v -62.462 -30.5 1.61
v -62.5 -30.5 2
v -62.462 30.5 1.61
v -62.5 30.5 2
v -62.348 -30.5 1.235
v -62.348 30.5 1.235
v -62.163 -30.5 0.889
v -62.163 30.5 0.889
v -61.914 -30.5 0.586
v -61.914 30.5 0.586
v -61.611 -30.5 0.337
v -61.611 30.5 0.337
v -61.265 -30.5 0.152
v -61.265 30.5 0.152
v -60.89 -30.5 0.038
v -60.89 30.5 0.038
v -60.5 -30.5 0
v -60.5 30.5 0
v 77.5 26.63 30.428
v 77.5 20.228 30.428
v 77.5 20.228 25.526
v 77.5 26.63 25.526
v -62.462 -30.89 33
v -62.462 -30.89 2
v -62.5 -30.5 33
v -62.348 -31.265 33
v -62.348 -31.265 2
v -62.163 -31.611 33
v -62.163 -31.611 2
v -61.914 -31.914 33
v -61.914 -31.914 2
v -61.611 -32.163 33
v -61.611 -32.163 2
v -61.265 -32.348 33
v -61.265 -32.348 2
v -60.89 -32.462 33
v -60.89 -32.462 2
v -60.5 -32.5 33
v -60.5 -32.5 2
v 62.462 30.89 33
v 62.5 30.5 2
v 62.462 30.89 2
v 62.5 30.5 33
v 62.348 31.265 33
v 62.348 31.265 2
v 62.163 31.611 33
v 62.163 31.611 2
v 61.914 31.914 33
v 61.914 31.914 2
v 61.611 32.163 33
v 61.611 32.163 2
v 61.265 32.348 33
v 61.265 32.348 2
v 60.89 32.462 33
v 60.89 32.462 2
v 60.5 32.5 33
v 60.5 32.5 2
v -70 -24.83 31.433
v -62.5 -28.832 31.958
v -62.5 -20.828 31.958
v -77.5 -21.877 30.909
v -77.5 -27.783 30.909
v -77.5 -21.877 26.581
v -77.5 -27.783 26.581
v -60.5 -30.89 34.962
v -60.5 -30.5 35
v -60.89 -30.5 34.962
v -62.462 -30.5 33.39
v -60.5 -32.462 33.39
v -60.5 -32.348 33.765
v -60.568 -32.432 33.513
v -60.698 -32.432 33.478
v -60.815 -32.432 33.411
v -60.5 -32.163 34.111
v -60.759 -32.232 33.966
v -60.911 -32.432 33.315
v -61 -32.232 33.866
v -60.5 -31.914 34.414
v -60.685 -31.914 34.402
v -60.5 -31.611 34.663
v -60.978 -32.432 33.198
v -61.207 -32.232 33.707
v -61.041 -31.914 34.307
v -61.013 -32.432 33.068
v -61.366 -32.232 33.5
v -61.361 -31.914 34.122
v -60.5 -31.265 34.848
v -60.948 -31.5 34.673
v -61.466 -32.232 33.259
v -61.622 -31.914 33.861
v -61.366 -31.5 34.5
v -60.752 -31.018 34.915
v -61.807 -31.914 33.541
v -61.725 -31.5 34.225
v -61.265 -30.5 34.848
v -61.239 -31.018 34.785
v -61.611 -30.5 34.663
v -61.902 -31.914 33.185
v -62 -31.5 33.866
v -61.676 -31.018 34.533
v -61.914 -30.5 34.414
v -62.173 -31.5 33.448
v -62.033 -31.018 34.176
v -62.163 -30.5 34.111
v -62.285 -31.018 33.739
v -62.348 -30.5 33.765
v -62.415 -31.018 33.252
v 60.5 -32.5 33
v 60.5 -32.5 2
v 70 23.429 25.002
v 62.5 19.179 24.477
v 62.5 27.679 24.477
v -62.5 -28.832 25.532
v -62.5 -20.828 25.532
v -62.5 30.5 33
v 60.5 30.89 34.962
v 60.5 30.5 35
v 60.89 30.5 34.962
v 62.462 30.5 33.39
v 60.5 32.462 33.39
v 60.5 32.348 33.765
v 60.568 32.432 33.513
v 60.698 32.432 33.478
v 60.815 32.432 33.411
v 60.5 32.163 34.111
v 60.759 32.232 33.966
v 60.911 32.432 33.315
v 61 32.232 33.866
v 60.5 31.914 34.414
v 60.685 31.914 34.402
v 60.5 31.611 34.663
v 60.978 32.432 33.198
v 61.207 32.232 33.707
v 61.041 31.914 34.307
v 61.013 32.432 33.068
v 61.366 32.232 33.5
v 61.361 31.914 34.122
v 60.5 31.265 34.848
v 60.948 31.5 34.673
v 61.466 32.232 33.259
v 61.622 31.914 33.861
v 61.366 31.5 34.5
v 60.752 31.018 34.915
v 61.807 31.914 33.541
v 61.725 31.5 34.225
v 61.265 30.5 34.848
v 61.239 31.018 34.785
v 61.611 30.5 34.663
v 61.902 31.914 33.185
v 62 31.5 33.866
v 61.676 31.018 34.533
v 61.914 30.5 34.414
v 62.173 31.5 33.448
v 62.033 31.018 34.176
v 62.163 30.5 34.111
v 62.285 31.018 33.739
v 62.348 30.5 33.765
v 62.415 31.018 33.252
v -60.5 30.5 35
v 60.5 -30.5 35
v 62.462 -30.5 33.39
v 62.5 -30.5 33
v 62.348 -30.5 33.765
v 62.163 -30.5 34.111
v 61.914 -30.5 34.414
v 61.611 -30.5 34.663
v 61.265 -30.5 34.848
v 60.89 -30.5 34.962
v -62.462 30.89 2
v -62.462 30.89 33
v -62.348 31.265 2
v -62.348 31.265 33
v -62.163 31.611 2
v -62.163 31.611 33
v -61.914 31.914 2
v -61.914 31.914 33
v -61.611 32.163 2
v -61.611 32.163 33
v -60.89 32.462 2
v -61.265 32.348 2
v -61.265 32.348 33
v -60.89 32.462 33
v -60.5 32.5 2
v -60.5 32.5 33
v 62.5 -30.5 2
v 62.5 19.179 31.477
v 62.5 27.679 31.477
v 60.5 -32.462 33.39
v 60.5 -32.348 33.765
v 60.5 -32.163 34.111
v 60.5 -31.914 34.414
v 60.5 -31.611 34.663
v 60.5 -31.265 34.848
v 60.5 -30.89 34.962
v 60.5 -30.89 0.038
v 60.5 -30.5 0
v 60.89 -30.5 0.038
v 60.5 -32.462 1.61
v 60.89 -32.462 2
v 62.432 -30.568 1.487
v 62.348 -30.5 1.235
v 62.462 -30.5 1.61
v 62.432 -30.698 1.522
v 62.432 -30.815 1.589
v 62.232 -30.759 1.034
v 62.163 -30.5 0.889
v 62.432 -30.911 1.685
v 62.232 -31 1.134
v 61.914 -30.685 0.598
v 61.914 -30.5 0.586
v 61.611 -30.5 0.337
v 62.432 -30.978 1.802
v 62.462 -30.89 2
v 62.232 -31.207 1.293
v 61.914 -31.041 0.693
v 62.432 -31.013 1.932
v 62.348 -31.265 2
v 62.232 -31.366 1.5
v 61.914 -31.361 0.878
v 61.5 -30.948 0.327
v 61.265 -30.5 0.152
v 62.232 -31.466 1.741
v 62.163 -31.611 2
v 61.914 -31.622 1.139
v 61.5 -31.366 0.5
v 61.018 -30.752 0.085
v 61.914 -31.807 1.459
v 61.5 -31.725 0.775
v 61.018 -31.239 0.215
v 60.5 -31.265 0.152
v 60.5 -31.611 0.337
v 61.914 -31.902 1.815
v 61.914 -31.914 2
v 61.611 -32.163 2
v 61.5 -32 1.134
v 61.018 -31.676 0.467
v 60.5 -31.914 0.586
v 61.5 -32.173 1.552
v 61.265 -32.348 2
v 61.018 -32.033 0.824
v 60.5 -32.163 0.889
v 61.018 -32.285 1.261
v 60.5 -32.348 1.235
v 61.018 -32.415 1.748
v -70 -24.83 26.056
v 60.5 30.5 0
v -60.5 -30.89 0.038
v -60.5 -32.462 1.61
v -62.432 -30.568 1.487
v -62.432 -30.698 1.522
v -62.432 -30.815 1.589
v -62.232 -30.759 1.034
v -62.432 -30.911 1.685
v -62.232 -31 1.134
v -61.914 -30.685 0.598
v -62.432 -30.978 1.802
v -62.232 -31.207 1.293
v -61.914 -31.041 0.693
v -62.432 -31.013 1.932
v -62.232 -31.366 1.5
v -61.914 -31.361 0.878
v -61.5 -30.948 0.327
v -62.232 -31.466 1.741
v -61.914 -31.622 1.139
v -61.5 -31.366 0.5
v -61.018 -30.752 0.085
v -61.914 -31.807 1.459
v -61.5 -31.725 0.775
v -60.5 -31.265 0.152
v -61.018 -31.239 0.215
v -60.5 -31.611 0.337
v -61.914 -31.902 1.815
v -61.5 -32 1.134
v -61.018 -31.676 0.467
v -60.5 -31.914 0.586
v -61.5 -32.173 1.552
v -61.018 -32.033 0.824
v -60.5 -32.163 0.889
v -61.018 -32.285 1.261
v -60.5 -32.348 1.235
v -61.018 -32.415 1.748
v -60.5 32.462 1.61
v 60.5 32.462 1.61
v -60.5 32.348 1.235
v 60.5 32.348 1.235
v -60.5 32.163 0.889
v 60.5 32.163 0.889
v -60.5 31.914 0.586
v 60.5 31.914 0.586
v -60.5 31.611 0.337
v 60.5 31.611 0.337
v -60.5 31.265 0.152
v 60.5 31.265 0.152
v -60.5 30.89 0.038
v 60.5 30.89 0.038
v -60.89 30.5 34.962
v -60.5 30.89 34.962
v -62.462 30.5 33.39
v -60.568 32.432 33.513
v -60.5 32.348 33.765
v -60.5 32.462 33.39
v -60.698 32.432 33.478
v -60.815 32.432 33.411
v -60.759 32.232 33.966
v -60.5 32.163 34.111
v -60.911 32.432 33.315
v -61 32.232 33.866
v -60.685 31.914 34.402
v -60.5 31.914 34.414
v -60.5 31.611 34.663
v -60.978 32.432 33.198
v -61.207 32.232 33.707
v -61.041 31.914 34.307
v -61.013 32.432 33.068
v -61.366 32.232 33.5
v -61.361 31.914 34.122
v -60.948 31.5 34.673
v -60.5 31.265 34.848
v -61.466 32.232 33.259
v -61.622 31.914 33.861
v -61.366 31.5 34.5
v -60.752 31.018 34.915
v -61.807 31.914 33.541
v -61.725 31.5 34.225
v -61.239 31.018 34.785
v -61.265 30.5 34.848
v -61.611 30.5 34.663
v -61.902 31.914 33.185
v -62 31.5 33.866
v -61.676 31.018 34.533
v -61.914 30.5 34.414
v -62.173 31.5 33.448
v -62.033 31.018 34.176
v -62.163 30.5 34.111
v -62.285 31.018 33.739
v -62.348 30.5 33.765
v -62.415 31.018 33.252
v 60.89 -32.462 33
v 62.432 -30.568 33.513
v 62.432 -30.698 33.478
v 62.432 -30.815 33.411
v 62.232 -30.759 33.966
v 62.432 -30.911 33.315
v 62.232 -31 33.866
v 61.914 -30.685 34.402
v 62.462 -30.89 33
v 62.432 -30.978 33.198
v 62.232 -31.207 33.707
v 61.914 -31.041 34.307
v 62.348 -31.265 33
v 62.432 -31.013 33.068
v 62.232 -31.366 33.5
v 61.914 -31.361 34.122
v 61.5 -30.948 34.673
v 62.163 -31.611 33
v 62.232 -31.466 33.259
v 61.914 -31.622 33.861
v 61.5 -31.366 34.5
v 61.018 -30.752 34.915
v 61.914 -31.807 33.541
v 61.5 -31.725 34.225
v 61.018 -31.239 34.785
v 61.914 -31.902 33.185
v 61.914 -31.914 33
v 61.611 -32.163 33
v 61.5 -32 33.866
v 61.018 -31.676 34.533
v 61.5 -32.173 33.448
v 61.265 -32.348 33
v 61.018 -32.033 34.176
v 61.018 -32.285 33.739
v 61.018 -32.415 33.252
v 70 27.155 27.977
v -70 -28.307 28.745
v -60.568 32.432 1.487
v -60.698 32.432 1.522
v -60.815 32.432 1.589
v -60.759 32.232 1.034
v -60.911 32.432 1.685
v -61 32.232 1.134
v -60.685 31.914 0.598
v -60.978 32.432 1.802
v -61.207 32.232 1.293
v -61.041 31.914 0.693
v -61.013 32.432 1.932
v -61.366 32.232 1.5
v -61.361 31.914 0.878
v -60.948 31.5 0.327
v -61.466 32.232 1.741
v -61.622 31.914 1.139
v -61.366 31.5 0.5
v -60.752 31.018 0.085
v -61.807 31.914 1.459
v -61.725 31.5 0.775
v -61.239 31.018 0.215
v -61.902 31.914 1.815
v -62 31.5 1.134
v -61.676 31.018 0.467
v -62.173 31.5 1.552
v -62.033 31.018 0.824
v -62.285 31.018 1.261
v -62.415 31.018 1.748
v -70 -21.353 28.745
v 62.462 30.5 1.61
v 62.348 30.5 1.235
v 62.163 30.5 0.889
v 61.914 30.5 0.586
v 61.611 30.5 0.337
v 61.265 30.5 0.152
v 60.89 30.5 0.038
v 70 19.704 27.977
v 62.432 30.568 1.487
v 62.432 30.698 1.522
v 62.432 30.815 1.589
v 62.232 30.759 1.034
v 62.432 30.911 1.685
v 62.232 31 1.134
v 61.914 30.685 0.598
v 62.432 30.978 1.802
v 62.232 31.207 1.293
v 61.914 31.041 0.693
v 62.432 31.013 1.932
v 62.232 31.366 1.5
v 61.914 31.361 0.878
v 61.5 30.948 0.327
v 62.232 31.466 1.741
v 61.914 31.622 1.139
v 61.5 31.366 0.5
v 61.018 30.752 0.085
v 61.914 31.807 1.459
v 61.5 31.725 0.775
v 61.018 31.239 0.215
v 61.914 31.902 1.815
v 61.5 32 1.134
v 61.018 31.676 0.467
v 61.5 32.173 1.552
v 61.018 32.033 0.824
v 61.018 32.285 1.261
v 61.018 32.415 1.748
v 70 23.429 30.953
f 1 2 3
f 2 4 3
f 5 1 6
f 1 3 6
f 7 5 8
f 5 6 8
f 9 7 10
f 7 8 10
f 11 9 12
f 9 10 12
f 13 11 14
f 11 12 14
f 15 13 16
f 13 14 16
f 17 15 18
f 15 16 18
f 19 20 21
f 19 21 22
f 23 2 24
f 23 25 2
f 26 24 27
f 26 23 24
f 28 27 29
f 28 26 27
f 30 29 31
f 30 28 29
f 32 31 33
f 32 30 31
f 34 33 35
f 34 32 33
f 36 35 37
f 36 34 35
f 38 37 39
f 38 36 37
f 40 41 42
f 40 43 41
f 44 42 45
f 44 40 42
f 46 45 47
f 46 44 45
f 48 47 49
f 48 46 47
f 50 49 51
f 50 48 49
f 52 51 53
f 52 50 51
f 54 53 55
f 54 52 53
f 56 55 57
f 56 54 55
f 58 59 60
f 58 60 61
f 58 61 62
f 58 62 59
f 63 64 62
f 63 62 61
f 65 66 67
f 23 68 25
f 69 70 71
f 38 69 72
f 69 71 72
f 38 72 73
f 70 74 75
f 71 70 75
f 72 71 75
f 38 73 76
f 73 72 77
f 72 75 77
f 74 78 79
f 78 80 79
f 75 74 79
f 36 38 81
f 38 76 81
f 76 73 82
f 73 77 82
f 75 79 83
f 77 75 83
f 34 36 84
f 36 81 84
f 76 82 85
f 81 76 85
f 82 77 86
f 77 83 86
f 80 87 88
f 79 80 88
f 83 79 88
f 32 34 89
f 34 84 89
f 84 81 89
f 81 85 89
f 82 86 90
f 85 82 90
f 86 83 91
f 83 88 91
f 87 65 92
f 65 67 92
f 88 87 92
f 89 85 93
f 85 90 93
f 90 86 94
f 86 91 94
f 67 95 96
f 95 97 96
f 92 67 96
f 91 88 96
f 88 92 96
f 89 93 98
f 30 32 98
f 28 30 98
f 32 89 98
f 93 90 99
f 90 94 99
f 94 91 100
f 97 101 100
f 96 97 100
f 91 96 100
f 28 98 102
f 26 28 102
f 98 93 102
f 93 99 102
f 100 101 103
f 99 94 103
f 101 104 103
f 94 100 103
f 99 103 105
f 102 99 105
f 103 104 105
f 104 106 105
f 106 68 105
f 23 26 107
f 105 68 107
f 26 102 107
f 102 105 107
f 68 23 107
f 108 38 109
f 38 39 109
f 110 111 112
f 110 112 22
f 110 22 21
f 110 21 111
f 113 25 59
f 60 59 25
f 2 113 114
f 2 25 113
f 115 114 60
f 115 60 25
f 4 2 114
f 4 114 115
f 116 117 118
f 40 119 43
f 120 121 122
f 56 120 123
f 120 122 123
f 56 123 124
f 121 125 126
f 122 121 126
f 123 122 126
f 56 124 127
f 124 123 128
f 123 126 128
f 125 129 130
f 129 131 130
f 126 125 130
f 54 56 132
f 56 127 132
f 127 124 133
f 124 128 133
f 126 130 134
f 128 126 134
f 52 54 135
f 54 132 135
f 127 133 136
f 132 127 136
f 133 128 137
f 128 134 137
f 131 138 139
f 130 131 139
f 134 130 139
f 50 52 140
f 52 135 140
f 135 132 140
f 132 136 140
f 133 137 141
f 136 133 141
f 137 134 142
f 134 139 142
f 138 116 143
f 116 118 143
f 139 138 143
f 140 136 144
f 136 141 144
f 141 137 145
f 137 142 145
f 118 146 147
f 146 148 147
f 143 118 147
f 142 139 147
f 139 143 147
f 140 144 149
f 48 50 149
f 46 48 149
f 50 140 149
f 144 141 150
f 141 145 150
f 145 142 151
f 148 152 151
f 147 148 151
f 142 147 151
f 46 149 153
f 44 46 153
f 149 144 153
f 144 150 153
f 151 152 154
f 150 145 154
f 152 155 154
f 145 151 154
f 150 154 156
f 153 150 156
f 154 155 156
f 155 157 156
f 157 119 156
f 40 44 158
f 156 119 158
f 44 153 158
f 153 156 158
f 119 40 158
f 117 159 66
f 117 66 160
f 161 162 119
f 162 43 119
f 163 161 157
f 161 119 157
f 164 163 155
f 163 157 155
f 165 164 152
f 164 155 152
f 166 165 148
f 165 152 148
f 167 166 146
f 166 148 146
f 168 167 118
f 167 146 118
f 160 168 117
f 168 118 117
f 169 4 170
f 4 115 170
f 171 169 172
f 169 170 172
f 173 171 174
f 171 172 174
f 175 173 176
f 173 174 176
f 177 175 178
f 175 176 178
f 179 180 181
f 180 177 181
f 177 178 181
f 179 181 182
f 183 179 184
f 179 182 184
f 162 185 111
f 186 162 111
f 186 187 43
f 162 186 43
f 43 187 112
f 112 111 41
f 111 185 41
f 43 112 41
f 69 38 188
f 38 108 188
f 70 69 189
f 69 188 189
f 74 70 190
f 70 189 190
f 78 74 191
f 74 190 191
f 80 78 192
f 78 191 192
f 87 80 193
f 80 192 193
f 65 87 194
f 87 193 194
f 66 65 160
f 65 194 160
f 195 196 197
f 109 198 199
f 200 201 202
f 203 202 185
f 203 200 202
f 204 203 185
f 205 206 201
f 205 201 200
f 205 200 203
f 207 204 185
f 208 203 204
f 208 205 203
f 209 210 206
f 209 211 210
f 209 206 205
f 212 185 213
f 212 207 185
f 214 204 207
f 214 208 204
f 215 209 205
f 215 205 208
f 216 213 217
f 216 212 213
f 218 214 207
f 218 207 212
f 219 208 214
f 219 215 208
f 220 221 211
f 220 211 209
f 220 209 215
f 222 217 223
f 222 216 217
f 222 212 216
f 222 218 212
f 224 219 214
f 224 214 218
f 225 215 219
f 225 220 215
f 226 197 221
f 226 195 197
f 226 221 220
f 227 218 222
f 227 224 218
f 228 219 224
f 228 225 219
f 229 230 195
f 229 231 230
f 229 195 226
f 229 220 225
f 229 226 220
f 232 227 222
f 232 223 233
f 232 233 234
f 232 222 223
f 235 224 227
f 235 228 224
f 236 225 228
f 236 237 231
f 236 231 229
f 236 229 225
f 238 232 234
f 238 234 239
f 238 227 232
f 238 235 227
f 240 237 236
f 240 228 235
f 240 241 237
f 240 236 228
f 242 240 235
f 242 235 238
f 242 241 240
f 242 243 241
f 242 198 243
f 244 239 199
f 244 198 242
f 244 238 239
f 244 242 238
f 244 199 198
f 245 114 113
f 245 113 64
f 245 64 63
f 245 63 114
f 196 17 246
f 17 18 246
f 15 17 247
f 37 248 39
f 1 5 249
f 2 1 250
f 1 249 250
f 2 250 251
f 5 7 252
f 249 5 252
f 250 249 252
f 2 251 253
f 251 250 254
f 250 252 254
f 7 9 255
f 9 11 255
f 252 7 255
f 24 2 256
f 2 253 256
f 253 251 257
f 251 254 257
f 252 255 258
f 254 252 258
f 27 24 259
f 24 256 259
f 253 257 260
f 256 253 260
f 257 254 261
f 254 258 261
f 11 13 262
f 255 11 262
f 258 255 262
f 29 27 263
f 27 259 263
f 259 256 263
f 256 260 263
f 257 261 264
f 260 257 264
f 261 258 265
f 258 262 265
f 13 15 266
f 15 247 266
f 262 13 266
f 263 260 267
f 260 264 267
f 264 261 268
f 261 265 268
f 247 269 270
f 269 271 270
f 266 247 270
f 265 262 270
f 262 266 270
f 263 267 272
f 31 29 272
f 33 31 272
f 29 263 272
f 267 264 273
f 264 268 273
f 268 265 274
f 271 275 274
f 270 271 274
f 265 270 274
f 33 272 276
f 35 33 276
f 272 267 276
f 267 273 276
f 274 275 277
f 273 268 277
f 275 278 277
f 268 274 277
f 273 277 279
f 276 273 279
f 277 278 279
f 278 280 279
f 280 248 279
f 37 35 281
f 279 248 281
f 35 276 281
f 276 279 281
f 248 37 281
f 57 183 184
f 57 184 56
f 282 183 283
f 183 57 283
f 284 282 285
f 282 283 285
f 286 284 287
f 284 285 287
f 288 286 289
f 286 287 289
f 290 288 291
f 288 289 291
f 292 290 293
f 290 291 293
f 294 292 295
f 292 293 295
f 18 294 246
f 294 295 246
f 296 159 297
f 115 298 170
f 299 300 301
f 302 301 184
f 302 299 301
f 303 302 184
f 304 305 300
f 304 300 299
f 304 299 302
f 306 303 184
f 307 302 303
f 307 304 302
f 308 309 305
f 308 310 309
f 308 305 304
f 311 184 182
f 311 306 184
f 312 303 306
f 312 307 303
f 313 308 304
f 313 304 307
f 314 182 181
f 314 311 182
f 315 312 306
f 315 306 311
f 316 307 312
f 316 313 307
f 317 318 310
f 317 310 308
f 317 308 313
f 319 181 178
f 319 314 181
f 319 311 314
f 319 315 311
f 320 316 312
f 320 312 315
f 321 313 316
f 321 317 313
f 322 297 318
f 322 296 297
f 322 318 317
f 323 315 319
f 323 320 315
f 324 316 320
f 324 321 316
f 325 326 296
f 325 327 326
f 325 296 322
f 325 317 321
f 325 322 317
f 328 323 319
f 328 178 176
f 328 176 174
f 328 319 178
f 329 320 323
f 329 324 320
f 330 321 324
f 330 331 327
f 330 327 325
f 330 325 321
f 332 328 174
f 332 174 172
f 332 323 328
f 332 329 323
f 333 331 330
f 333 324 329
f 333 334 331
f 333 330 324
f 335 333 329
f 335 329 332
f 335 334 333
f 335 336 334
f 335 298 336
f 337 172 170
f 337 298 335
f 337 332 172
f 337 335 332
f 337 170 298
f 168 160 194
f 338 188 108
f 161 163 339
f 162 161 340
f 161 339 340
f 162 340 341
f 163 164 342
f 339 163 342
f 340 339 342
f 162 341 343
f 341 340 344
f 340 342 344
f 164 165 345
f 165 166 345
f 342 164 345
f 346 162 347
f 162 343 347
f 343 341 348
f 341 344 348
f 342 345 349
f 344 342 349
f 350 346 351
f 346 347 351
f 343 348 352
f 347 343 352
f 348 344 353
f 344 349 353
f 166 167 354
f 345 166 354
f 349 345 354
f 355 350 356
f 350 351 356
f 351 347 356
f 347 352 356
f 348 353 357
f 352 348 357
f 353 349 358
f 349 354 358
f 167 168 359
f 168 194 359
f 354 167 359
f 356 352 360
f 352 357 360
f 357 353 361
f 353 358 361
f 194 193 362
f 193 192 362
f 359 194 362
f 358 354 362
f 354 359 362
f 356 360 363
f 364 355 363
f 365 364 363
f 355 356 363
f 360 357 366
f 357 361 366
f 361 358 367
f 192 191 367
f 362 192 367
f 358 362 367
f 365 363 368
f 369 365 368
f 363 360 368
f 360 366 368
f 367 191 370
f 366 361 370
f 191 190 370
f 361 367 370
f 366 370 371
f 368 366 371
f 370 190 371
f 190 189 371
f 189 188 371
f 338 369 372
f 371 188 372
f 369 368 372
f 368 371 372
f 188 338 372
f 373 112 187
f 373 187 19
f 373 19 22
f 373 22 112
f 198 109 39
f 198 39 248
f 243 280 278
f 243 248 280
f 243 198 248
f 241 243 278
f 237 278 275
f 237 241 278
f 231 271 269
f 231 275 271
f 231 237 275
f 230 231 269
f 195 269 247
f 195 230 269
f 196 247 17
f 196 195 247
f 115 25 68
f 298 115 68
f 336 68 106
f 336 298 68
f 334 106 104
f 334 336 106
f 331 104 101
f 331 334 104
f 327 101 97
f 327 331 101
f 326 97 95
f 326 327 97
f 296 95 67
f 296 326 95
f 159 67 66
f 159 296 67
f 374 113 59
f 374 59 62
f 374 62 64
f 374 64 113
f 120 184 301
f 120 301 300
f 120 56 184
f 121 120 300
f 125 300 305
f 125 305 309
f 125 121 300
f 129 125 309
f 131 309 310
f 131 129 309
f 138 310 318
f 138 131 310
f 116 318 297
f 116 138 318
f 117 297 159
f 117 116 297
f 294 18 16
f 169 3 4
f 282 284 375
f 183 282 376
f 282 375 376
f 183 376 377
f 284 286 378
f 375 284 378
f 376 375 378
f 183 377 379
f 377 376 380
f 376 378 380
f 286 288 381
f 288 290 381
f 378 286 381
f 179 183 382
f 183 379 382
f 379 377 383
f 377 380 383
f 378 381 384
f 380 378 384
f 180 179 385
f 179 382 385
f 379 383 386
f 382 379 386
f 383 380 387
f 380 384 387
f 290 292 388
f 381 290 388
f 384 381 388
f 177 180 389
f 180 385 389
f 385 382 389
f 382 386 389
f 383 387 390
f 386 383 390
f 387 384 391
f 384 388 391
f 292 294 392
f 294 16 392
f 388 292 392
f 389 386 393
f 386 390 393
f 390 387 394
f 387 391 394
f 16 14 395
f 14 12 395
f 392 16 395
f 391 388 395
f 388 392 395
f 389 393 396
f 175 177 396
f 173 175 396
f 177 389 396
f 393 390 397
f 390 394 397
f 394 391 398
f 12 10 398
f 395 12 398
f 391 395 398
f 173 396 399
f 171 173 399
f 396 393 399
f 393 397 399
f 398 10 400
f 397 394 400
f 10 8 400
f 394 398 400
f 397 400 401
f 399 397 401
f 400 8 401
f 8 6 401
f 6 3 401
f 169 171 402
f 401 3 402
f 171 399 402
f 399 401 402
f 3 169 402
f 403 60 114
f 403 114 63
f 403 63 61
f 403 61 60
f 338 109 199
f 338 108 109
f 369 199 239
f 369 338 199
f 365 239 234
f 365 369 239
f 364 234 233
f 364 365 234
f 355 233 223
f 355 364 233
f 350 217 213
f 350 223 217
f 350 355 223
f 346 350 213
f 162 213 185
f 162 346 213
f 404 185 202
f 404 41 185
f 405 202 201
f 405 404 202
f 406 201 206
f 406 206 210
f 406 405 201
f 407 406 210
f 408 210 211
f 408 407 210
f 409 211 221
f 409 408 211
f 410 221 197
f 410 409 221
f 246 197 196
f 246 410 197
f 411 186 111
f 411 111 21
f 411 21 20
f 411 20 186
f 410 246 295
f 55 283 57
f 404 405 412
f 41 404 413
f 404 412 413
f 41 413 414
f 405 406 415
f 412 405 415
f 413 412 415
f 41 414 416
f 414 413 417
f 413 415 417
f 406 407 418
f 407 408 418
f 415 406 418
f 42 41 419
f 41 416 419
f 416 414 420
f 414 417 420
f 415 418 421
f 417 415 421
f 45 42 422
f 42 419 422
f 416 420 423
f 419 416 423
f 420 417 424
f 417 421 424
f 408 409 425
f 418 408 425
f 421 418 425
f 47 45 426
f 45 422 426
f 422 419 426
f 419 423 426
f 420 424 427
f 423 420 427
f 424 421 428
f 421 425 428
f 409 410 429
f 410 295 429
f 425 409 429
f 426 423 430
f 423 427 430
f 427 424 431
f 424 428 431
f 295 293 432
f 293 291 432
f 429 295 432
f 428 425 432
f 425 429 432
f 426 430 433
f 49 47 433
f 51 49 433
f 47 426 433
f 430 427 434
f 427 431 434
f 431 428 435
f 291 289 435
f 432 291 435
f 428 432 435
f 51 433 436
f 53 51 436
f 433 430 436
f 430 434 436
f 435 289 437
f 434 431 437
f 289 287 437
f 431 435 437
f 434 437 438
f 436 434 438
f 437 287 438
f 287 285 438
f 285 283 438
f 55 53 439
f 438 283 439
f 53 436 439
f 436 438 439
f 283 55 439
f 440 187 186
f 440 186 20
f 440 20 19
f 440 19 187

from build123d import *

# Parameters (mm, degrees)
SKETCH1_W           = 125
SKETCH1_H           = 65
BOSS_EXTRUDE1_DEPTH = 35
FILLET1_R           = 2
SKETCH2_W           = 7
SKETCH2_H           = 8.5
BOSS_EXTRUDE2_DEPTH = 15
BOSS_EXTRUDE2_TAPER = 4
SKETCH3_W           = 6.425912995
SKETCH3_H           = 8.003375871
BOSS_EXTRUDE3_DEPTH = 15
BOSS_EXTRUDE3_TAPER = 4


with BuildPart() as part:
    # Sketch1 → Boss-Extrude1 (new body)
    with BuildSketch(Plane.XY):
        Rectangle(SKETCH1_W, SKETCH1_H)
    extrude(amount=BOSS_EXTRUDE1_DEPTH)

    # Fillet1
    fillet1_edges = [part.edges().sort_by_distance(p)[0] for p in [
        (-62.5, 0, 35),
        (0, -32.5, 35),
        (62.5, 0, 35),
        (0, -32.5, 0),
        (-62.5, 0, 0),
        (0, 32.5, 0),
        (62.5, 0, 0),
        (0, 32.5, 35),
        (62.5, -32.5, 17.5),
        (-62.5, -32.5, 17.5),
        (-62.5, 32.5, 17.5),
        (62.5, 32.5, 17.5),
    ]]
    fillet(fillet1_edges, radius=FILLET1_R)

    # Sketch2 → Boss-Extrude2 (add)
    with BuildSketch(Plane(origin=(62.5, 0, 0), x_dir=(0, 0, -1), z_dir=(1, 0, 0))):
        with Locations((-27.977253616, 23.429314173)):
            Rectangle(SKETCH2_W, SKETCH2_H)
    extrude(amount=BOSS_EXTRUDE2_DEPTH, taper=BOSS_EXTRUDE2_TAPER)

    # Sketch3 → Boss-Extrude3 (add)
    with BuildSketch(Plane.ZY.offset(62.5)):
        with Locations((28.744757, -24.829951406)):
            Rectangle(SKETCH3_W, SKETCH3_H)
    extrude(amount=BOSS_EXTRUDE3_DEPTH, taper=BOSS_EXTRUDE3_TAPER)


solid = part.part
